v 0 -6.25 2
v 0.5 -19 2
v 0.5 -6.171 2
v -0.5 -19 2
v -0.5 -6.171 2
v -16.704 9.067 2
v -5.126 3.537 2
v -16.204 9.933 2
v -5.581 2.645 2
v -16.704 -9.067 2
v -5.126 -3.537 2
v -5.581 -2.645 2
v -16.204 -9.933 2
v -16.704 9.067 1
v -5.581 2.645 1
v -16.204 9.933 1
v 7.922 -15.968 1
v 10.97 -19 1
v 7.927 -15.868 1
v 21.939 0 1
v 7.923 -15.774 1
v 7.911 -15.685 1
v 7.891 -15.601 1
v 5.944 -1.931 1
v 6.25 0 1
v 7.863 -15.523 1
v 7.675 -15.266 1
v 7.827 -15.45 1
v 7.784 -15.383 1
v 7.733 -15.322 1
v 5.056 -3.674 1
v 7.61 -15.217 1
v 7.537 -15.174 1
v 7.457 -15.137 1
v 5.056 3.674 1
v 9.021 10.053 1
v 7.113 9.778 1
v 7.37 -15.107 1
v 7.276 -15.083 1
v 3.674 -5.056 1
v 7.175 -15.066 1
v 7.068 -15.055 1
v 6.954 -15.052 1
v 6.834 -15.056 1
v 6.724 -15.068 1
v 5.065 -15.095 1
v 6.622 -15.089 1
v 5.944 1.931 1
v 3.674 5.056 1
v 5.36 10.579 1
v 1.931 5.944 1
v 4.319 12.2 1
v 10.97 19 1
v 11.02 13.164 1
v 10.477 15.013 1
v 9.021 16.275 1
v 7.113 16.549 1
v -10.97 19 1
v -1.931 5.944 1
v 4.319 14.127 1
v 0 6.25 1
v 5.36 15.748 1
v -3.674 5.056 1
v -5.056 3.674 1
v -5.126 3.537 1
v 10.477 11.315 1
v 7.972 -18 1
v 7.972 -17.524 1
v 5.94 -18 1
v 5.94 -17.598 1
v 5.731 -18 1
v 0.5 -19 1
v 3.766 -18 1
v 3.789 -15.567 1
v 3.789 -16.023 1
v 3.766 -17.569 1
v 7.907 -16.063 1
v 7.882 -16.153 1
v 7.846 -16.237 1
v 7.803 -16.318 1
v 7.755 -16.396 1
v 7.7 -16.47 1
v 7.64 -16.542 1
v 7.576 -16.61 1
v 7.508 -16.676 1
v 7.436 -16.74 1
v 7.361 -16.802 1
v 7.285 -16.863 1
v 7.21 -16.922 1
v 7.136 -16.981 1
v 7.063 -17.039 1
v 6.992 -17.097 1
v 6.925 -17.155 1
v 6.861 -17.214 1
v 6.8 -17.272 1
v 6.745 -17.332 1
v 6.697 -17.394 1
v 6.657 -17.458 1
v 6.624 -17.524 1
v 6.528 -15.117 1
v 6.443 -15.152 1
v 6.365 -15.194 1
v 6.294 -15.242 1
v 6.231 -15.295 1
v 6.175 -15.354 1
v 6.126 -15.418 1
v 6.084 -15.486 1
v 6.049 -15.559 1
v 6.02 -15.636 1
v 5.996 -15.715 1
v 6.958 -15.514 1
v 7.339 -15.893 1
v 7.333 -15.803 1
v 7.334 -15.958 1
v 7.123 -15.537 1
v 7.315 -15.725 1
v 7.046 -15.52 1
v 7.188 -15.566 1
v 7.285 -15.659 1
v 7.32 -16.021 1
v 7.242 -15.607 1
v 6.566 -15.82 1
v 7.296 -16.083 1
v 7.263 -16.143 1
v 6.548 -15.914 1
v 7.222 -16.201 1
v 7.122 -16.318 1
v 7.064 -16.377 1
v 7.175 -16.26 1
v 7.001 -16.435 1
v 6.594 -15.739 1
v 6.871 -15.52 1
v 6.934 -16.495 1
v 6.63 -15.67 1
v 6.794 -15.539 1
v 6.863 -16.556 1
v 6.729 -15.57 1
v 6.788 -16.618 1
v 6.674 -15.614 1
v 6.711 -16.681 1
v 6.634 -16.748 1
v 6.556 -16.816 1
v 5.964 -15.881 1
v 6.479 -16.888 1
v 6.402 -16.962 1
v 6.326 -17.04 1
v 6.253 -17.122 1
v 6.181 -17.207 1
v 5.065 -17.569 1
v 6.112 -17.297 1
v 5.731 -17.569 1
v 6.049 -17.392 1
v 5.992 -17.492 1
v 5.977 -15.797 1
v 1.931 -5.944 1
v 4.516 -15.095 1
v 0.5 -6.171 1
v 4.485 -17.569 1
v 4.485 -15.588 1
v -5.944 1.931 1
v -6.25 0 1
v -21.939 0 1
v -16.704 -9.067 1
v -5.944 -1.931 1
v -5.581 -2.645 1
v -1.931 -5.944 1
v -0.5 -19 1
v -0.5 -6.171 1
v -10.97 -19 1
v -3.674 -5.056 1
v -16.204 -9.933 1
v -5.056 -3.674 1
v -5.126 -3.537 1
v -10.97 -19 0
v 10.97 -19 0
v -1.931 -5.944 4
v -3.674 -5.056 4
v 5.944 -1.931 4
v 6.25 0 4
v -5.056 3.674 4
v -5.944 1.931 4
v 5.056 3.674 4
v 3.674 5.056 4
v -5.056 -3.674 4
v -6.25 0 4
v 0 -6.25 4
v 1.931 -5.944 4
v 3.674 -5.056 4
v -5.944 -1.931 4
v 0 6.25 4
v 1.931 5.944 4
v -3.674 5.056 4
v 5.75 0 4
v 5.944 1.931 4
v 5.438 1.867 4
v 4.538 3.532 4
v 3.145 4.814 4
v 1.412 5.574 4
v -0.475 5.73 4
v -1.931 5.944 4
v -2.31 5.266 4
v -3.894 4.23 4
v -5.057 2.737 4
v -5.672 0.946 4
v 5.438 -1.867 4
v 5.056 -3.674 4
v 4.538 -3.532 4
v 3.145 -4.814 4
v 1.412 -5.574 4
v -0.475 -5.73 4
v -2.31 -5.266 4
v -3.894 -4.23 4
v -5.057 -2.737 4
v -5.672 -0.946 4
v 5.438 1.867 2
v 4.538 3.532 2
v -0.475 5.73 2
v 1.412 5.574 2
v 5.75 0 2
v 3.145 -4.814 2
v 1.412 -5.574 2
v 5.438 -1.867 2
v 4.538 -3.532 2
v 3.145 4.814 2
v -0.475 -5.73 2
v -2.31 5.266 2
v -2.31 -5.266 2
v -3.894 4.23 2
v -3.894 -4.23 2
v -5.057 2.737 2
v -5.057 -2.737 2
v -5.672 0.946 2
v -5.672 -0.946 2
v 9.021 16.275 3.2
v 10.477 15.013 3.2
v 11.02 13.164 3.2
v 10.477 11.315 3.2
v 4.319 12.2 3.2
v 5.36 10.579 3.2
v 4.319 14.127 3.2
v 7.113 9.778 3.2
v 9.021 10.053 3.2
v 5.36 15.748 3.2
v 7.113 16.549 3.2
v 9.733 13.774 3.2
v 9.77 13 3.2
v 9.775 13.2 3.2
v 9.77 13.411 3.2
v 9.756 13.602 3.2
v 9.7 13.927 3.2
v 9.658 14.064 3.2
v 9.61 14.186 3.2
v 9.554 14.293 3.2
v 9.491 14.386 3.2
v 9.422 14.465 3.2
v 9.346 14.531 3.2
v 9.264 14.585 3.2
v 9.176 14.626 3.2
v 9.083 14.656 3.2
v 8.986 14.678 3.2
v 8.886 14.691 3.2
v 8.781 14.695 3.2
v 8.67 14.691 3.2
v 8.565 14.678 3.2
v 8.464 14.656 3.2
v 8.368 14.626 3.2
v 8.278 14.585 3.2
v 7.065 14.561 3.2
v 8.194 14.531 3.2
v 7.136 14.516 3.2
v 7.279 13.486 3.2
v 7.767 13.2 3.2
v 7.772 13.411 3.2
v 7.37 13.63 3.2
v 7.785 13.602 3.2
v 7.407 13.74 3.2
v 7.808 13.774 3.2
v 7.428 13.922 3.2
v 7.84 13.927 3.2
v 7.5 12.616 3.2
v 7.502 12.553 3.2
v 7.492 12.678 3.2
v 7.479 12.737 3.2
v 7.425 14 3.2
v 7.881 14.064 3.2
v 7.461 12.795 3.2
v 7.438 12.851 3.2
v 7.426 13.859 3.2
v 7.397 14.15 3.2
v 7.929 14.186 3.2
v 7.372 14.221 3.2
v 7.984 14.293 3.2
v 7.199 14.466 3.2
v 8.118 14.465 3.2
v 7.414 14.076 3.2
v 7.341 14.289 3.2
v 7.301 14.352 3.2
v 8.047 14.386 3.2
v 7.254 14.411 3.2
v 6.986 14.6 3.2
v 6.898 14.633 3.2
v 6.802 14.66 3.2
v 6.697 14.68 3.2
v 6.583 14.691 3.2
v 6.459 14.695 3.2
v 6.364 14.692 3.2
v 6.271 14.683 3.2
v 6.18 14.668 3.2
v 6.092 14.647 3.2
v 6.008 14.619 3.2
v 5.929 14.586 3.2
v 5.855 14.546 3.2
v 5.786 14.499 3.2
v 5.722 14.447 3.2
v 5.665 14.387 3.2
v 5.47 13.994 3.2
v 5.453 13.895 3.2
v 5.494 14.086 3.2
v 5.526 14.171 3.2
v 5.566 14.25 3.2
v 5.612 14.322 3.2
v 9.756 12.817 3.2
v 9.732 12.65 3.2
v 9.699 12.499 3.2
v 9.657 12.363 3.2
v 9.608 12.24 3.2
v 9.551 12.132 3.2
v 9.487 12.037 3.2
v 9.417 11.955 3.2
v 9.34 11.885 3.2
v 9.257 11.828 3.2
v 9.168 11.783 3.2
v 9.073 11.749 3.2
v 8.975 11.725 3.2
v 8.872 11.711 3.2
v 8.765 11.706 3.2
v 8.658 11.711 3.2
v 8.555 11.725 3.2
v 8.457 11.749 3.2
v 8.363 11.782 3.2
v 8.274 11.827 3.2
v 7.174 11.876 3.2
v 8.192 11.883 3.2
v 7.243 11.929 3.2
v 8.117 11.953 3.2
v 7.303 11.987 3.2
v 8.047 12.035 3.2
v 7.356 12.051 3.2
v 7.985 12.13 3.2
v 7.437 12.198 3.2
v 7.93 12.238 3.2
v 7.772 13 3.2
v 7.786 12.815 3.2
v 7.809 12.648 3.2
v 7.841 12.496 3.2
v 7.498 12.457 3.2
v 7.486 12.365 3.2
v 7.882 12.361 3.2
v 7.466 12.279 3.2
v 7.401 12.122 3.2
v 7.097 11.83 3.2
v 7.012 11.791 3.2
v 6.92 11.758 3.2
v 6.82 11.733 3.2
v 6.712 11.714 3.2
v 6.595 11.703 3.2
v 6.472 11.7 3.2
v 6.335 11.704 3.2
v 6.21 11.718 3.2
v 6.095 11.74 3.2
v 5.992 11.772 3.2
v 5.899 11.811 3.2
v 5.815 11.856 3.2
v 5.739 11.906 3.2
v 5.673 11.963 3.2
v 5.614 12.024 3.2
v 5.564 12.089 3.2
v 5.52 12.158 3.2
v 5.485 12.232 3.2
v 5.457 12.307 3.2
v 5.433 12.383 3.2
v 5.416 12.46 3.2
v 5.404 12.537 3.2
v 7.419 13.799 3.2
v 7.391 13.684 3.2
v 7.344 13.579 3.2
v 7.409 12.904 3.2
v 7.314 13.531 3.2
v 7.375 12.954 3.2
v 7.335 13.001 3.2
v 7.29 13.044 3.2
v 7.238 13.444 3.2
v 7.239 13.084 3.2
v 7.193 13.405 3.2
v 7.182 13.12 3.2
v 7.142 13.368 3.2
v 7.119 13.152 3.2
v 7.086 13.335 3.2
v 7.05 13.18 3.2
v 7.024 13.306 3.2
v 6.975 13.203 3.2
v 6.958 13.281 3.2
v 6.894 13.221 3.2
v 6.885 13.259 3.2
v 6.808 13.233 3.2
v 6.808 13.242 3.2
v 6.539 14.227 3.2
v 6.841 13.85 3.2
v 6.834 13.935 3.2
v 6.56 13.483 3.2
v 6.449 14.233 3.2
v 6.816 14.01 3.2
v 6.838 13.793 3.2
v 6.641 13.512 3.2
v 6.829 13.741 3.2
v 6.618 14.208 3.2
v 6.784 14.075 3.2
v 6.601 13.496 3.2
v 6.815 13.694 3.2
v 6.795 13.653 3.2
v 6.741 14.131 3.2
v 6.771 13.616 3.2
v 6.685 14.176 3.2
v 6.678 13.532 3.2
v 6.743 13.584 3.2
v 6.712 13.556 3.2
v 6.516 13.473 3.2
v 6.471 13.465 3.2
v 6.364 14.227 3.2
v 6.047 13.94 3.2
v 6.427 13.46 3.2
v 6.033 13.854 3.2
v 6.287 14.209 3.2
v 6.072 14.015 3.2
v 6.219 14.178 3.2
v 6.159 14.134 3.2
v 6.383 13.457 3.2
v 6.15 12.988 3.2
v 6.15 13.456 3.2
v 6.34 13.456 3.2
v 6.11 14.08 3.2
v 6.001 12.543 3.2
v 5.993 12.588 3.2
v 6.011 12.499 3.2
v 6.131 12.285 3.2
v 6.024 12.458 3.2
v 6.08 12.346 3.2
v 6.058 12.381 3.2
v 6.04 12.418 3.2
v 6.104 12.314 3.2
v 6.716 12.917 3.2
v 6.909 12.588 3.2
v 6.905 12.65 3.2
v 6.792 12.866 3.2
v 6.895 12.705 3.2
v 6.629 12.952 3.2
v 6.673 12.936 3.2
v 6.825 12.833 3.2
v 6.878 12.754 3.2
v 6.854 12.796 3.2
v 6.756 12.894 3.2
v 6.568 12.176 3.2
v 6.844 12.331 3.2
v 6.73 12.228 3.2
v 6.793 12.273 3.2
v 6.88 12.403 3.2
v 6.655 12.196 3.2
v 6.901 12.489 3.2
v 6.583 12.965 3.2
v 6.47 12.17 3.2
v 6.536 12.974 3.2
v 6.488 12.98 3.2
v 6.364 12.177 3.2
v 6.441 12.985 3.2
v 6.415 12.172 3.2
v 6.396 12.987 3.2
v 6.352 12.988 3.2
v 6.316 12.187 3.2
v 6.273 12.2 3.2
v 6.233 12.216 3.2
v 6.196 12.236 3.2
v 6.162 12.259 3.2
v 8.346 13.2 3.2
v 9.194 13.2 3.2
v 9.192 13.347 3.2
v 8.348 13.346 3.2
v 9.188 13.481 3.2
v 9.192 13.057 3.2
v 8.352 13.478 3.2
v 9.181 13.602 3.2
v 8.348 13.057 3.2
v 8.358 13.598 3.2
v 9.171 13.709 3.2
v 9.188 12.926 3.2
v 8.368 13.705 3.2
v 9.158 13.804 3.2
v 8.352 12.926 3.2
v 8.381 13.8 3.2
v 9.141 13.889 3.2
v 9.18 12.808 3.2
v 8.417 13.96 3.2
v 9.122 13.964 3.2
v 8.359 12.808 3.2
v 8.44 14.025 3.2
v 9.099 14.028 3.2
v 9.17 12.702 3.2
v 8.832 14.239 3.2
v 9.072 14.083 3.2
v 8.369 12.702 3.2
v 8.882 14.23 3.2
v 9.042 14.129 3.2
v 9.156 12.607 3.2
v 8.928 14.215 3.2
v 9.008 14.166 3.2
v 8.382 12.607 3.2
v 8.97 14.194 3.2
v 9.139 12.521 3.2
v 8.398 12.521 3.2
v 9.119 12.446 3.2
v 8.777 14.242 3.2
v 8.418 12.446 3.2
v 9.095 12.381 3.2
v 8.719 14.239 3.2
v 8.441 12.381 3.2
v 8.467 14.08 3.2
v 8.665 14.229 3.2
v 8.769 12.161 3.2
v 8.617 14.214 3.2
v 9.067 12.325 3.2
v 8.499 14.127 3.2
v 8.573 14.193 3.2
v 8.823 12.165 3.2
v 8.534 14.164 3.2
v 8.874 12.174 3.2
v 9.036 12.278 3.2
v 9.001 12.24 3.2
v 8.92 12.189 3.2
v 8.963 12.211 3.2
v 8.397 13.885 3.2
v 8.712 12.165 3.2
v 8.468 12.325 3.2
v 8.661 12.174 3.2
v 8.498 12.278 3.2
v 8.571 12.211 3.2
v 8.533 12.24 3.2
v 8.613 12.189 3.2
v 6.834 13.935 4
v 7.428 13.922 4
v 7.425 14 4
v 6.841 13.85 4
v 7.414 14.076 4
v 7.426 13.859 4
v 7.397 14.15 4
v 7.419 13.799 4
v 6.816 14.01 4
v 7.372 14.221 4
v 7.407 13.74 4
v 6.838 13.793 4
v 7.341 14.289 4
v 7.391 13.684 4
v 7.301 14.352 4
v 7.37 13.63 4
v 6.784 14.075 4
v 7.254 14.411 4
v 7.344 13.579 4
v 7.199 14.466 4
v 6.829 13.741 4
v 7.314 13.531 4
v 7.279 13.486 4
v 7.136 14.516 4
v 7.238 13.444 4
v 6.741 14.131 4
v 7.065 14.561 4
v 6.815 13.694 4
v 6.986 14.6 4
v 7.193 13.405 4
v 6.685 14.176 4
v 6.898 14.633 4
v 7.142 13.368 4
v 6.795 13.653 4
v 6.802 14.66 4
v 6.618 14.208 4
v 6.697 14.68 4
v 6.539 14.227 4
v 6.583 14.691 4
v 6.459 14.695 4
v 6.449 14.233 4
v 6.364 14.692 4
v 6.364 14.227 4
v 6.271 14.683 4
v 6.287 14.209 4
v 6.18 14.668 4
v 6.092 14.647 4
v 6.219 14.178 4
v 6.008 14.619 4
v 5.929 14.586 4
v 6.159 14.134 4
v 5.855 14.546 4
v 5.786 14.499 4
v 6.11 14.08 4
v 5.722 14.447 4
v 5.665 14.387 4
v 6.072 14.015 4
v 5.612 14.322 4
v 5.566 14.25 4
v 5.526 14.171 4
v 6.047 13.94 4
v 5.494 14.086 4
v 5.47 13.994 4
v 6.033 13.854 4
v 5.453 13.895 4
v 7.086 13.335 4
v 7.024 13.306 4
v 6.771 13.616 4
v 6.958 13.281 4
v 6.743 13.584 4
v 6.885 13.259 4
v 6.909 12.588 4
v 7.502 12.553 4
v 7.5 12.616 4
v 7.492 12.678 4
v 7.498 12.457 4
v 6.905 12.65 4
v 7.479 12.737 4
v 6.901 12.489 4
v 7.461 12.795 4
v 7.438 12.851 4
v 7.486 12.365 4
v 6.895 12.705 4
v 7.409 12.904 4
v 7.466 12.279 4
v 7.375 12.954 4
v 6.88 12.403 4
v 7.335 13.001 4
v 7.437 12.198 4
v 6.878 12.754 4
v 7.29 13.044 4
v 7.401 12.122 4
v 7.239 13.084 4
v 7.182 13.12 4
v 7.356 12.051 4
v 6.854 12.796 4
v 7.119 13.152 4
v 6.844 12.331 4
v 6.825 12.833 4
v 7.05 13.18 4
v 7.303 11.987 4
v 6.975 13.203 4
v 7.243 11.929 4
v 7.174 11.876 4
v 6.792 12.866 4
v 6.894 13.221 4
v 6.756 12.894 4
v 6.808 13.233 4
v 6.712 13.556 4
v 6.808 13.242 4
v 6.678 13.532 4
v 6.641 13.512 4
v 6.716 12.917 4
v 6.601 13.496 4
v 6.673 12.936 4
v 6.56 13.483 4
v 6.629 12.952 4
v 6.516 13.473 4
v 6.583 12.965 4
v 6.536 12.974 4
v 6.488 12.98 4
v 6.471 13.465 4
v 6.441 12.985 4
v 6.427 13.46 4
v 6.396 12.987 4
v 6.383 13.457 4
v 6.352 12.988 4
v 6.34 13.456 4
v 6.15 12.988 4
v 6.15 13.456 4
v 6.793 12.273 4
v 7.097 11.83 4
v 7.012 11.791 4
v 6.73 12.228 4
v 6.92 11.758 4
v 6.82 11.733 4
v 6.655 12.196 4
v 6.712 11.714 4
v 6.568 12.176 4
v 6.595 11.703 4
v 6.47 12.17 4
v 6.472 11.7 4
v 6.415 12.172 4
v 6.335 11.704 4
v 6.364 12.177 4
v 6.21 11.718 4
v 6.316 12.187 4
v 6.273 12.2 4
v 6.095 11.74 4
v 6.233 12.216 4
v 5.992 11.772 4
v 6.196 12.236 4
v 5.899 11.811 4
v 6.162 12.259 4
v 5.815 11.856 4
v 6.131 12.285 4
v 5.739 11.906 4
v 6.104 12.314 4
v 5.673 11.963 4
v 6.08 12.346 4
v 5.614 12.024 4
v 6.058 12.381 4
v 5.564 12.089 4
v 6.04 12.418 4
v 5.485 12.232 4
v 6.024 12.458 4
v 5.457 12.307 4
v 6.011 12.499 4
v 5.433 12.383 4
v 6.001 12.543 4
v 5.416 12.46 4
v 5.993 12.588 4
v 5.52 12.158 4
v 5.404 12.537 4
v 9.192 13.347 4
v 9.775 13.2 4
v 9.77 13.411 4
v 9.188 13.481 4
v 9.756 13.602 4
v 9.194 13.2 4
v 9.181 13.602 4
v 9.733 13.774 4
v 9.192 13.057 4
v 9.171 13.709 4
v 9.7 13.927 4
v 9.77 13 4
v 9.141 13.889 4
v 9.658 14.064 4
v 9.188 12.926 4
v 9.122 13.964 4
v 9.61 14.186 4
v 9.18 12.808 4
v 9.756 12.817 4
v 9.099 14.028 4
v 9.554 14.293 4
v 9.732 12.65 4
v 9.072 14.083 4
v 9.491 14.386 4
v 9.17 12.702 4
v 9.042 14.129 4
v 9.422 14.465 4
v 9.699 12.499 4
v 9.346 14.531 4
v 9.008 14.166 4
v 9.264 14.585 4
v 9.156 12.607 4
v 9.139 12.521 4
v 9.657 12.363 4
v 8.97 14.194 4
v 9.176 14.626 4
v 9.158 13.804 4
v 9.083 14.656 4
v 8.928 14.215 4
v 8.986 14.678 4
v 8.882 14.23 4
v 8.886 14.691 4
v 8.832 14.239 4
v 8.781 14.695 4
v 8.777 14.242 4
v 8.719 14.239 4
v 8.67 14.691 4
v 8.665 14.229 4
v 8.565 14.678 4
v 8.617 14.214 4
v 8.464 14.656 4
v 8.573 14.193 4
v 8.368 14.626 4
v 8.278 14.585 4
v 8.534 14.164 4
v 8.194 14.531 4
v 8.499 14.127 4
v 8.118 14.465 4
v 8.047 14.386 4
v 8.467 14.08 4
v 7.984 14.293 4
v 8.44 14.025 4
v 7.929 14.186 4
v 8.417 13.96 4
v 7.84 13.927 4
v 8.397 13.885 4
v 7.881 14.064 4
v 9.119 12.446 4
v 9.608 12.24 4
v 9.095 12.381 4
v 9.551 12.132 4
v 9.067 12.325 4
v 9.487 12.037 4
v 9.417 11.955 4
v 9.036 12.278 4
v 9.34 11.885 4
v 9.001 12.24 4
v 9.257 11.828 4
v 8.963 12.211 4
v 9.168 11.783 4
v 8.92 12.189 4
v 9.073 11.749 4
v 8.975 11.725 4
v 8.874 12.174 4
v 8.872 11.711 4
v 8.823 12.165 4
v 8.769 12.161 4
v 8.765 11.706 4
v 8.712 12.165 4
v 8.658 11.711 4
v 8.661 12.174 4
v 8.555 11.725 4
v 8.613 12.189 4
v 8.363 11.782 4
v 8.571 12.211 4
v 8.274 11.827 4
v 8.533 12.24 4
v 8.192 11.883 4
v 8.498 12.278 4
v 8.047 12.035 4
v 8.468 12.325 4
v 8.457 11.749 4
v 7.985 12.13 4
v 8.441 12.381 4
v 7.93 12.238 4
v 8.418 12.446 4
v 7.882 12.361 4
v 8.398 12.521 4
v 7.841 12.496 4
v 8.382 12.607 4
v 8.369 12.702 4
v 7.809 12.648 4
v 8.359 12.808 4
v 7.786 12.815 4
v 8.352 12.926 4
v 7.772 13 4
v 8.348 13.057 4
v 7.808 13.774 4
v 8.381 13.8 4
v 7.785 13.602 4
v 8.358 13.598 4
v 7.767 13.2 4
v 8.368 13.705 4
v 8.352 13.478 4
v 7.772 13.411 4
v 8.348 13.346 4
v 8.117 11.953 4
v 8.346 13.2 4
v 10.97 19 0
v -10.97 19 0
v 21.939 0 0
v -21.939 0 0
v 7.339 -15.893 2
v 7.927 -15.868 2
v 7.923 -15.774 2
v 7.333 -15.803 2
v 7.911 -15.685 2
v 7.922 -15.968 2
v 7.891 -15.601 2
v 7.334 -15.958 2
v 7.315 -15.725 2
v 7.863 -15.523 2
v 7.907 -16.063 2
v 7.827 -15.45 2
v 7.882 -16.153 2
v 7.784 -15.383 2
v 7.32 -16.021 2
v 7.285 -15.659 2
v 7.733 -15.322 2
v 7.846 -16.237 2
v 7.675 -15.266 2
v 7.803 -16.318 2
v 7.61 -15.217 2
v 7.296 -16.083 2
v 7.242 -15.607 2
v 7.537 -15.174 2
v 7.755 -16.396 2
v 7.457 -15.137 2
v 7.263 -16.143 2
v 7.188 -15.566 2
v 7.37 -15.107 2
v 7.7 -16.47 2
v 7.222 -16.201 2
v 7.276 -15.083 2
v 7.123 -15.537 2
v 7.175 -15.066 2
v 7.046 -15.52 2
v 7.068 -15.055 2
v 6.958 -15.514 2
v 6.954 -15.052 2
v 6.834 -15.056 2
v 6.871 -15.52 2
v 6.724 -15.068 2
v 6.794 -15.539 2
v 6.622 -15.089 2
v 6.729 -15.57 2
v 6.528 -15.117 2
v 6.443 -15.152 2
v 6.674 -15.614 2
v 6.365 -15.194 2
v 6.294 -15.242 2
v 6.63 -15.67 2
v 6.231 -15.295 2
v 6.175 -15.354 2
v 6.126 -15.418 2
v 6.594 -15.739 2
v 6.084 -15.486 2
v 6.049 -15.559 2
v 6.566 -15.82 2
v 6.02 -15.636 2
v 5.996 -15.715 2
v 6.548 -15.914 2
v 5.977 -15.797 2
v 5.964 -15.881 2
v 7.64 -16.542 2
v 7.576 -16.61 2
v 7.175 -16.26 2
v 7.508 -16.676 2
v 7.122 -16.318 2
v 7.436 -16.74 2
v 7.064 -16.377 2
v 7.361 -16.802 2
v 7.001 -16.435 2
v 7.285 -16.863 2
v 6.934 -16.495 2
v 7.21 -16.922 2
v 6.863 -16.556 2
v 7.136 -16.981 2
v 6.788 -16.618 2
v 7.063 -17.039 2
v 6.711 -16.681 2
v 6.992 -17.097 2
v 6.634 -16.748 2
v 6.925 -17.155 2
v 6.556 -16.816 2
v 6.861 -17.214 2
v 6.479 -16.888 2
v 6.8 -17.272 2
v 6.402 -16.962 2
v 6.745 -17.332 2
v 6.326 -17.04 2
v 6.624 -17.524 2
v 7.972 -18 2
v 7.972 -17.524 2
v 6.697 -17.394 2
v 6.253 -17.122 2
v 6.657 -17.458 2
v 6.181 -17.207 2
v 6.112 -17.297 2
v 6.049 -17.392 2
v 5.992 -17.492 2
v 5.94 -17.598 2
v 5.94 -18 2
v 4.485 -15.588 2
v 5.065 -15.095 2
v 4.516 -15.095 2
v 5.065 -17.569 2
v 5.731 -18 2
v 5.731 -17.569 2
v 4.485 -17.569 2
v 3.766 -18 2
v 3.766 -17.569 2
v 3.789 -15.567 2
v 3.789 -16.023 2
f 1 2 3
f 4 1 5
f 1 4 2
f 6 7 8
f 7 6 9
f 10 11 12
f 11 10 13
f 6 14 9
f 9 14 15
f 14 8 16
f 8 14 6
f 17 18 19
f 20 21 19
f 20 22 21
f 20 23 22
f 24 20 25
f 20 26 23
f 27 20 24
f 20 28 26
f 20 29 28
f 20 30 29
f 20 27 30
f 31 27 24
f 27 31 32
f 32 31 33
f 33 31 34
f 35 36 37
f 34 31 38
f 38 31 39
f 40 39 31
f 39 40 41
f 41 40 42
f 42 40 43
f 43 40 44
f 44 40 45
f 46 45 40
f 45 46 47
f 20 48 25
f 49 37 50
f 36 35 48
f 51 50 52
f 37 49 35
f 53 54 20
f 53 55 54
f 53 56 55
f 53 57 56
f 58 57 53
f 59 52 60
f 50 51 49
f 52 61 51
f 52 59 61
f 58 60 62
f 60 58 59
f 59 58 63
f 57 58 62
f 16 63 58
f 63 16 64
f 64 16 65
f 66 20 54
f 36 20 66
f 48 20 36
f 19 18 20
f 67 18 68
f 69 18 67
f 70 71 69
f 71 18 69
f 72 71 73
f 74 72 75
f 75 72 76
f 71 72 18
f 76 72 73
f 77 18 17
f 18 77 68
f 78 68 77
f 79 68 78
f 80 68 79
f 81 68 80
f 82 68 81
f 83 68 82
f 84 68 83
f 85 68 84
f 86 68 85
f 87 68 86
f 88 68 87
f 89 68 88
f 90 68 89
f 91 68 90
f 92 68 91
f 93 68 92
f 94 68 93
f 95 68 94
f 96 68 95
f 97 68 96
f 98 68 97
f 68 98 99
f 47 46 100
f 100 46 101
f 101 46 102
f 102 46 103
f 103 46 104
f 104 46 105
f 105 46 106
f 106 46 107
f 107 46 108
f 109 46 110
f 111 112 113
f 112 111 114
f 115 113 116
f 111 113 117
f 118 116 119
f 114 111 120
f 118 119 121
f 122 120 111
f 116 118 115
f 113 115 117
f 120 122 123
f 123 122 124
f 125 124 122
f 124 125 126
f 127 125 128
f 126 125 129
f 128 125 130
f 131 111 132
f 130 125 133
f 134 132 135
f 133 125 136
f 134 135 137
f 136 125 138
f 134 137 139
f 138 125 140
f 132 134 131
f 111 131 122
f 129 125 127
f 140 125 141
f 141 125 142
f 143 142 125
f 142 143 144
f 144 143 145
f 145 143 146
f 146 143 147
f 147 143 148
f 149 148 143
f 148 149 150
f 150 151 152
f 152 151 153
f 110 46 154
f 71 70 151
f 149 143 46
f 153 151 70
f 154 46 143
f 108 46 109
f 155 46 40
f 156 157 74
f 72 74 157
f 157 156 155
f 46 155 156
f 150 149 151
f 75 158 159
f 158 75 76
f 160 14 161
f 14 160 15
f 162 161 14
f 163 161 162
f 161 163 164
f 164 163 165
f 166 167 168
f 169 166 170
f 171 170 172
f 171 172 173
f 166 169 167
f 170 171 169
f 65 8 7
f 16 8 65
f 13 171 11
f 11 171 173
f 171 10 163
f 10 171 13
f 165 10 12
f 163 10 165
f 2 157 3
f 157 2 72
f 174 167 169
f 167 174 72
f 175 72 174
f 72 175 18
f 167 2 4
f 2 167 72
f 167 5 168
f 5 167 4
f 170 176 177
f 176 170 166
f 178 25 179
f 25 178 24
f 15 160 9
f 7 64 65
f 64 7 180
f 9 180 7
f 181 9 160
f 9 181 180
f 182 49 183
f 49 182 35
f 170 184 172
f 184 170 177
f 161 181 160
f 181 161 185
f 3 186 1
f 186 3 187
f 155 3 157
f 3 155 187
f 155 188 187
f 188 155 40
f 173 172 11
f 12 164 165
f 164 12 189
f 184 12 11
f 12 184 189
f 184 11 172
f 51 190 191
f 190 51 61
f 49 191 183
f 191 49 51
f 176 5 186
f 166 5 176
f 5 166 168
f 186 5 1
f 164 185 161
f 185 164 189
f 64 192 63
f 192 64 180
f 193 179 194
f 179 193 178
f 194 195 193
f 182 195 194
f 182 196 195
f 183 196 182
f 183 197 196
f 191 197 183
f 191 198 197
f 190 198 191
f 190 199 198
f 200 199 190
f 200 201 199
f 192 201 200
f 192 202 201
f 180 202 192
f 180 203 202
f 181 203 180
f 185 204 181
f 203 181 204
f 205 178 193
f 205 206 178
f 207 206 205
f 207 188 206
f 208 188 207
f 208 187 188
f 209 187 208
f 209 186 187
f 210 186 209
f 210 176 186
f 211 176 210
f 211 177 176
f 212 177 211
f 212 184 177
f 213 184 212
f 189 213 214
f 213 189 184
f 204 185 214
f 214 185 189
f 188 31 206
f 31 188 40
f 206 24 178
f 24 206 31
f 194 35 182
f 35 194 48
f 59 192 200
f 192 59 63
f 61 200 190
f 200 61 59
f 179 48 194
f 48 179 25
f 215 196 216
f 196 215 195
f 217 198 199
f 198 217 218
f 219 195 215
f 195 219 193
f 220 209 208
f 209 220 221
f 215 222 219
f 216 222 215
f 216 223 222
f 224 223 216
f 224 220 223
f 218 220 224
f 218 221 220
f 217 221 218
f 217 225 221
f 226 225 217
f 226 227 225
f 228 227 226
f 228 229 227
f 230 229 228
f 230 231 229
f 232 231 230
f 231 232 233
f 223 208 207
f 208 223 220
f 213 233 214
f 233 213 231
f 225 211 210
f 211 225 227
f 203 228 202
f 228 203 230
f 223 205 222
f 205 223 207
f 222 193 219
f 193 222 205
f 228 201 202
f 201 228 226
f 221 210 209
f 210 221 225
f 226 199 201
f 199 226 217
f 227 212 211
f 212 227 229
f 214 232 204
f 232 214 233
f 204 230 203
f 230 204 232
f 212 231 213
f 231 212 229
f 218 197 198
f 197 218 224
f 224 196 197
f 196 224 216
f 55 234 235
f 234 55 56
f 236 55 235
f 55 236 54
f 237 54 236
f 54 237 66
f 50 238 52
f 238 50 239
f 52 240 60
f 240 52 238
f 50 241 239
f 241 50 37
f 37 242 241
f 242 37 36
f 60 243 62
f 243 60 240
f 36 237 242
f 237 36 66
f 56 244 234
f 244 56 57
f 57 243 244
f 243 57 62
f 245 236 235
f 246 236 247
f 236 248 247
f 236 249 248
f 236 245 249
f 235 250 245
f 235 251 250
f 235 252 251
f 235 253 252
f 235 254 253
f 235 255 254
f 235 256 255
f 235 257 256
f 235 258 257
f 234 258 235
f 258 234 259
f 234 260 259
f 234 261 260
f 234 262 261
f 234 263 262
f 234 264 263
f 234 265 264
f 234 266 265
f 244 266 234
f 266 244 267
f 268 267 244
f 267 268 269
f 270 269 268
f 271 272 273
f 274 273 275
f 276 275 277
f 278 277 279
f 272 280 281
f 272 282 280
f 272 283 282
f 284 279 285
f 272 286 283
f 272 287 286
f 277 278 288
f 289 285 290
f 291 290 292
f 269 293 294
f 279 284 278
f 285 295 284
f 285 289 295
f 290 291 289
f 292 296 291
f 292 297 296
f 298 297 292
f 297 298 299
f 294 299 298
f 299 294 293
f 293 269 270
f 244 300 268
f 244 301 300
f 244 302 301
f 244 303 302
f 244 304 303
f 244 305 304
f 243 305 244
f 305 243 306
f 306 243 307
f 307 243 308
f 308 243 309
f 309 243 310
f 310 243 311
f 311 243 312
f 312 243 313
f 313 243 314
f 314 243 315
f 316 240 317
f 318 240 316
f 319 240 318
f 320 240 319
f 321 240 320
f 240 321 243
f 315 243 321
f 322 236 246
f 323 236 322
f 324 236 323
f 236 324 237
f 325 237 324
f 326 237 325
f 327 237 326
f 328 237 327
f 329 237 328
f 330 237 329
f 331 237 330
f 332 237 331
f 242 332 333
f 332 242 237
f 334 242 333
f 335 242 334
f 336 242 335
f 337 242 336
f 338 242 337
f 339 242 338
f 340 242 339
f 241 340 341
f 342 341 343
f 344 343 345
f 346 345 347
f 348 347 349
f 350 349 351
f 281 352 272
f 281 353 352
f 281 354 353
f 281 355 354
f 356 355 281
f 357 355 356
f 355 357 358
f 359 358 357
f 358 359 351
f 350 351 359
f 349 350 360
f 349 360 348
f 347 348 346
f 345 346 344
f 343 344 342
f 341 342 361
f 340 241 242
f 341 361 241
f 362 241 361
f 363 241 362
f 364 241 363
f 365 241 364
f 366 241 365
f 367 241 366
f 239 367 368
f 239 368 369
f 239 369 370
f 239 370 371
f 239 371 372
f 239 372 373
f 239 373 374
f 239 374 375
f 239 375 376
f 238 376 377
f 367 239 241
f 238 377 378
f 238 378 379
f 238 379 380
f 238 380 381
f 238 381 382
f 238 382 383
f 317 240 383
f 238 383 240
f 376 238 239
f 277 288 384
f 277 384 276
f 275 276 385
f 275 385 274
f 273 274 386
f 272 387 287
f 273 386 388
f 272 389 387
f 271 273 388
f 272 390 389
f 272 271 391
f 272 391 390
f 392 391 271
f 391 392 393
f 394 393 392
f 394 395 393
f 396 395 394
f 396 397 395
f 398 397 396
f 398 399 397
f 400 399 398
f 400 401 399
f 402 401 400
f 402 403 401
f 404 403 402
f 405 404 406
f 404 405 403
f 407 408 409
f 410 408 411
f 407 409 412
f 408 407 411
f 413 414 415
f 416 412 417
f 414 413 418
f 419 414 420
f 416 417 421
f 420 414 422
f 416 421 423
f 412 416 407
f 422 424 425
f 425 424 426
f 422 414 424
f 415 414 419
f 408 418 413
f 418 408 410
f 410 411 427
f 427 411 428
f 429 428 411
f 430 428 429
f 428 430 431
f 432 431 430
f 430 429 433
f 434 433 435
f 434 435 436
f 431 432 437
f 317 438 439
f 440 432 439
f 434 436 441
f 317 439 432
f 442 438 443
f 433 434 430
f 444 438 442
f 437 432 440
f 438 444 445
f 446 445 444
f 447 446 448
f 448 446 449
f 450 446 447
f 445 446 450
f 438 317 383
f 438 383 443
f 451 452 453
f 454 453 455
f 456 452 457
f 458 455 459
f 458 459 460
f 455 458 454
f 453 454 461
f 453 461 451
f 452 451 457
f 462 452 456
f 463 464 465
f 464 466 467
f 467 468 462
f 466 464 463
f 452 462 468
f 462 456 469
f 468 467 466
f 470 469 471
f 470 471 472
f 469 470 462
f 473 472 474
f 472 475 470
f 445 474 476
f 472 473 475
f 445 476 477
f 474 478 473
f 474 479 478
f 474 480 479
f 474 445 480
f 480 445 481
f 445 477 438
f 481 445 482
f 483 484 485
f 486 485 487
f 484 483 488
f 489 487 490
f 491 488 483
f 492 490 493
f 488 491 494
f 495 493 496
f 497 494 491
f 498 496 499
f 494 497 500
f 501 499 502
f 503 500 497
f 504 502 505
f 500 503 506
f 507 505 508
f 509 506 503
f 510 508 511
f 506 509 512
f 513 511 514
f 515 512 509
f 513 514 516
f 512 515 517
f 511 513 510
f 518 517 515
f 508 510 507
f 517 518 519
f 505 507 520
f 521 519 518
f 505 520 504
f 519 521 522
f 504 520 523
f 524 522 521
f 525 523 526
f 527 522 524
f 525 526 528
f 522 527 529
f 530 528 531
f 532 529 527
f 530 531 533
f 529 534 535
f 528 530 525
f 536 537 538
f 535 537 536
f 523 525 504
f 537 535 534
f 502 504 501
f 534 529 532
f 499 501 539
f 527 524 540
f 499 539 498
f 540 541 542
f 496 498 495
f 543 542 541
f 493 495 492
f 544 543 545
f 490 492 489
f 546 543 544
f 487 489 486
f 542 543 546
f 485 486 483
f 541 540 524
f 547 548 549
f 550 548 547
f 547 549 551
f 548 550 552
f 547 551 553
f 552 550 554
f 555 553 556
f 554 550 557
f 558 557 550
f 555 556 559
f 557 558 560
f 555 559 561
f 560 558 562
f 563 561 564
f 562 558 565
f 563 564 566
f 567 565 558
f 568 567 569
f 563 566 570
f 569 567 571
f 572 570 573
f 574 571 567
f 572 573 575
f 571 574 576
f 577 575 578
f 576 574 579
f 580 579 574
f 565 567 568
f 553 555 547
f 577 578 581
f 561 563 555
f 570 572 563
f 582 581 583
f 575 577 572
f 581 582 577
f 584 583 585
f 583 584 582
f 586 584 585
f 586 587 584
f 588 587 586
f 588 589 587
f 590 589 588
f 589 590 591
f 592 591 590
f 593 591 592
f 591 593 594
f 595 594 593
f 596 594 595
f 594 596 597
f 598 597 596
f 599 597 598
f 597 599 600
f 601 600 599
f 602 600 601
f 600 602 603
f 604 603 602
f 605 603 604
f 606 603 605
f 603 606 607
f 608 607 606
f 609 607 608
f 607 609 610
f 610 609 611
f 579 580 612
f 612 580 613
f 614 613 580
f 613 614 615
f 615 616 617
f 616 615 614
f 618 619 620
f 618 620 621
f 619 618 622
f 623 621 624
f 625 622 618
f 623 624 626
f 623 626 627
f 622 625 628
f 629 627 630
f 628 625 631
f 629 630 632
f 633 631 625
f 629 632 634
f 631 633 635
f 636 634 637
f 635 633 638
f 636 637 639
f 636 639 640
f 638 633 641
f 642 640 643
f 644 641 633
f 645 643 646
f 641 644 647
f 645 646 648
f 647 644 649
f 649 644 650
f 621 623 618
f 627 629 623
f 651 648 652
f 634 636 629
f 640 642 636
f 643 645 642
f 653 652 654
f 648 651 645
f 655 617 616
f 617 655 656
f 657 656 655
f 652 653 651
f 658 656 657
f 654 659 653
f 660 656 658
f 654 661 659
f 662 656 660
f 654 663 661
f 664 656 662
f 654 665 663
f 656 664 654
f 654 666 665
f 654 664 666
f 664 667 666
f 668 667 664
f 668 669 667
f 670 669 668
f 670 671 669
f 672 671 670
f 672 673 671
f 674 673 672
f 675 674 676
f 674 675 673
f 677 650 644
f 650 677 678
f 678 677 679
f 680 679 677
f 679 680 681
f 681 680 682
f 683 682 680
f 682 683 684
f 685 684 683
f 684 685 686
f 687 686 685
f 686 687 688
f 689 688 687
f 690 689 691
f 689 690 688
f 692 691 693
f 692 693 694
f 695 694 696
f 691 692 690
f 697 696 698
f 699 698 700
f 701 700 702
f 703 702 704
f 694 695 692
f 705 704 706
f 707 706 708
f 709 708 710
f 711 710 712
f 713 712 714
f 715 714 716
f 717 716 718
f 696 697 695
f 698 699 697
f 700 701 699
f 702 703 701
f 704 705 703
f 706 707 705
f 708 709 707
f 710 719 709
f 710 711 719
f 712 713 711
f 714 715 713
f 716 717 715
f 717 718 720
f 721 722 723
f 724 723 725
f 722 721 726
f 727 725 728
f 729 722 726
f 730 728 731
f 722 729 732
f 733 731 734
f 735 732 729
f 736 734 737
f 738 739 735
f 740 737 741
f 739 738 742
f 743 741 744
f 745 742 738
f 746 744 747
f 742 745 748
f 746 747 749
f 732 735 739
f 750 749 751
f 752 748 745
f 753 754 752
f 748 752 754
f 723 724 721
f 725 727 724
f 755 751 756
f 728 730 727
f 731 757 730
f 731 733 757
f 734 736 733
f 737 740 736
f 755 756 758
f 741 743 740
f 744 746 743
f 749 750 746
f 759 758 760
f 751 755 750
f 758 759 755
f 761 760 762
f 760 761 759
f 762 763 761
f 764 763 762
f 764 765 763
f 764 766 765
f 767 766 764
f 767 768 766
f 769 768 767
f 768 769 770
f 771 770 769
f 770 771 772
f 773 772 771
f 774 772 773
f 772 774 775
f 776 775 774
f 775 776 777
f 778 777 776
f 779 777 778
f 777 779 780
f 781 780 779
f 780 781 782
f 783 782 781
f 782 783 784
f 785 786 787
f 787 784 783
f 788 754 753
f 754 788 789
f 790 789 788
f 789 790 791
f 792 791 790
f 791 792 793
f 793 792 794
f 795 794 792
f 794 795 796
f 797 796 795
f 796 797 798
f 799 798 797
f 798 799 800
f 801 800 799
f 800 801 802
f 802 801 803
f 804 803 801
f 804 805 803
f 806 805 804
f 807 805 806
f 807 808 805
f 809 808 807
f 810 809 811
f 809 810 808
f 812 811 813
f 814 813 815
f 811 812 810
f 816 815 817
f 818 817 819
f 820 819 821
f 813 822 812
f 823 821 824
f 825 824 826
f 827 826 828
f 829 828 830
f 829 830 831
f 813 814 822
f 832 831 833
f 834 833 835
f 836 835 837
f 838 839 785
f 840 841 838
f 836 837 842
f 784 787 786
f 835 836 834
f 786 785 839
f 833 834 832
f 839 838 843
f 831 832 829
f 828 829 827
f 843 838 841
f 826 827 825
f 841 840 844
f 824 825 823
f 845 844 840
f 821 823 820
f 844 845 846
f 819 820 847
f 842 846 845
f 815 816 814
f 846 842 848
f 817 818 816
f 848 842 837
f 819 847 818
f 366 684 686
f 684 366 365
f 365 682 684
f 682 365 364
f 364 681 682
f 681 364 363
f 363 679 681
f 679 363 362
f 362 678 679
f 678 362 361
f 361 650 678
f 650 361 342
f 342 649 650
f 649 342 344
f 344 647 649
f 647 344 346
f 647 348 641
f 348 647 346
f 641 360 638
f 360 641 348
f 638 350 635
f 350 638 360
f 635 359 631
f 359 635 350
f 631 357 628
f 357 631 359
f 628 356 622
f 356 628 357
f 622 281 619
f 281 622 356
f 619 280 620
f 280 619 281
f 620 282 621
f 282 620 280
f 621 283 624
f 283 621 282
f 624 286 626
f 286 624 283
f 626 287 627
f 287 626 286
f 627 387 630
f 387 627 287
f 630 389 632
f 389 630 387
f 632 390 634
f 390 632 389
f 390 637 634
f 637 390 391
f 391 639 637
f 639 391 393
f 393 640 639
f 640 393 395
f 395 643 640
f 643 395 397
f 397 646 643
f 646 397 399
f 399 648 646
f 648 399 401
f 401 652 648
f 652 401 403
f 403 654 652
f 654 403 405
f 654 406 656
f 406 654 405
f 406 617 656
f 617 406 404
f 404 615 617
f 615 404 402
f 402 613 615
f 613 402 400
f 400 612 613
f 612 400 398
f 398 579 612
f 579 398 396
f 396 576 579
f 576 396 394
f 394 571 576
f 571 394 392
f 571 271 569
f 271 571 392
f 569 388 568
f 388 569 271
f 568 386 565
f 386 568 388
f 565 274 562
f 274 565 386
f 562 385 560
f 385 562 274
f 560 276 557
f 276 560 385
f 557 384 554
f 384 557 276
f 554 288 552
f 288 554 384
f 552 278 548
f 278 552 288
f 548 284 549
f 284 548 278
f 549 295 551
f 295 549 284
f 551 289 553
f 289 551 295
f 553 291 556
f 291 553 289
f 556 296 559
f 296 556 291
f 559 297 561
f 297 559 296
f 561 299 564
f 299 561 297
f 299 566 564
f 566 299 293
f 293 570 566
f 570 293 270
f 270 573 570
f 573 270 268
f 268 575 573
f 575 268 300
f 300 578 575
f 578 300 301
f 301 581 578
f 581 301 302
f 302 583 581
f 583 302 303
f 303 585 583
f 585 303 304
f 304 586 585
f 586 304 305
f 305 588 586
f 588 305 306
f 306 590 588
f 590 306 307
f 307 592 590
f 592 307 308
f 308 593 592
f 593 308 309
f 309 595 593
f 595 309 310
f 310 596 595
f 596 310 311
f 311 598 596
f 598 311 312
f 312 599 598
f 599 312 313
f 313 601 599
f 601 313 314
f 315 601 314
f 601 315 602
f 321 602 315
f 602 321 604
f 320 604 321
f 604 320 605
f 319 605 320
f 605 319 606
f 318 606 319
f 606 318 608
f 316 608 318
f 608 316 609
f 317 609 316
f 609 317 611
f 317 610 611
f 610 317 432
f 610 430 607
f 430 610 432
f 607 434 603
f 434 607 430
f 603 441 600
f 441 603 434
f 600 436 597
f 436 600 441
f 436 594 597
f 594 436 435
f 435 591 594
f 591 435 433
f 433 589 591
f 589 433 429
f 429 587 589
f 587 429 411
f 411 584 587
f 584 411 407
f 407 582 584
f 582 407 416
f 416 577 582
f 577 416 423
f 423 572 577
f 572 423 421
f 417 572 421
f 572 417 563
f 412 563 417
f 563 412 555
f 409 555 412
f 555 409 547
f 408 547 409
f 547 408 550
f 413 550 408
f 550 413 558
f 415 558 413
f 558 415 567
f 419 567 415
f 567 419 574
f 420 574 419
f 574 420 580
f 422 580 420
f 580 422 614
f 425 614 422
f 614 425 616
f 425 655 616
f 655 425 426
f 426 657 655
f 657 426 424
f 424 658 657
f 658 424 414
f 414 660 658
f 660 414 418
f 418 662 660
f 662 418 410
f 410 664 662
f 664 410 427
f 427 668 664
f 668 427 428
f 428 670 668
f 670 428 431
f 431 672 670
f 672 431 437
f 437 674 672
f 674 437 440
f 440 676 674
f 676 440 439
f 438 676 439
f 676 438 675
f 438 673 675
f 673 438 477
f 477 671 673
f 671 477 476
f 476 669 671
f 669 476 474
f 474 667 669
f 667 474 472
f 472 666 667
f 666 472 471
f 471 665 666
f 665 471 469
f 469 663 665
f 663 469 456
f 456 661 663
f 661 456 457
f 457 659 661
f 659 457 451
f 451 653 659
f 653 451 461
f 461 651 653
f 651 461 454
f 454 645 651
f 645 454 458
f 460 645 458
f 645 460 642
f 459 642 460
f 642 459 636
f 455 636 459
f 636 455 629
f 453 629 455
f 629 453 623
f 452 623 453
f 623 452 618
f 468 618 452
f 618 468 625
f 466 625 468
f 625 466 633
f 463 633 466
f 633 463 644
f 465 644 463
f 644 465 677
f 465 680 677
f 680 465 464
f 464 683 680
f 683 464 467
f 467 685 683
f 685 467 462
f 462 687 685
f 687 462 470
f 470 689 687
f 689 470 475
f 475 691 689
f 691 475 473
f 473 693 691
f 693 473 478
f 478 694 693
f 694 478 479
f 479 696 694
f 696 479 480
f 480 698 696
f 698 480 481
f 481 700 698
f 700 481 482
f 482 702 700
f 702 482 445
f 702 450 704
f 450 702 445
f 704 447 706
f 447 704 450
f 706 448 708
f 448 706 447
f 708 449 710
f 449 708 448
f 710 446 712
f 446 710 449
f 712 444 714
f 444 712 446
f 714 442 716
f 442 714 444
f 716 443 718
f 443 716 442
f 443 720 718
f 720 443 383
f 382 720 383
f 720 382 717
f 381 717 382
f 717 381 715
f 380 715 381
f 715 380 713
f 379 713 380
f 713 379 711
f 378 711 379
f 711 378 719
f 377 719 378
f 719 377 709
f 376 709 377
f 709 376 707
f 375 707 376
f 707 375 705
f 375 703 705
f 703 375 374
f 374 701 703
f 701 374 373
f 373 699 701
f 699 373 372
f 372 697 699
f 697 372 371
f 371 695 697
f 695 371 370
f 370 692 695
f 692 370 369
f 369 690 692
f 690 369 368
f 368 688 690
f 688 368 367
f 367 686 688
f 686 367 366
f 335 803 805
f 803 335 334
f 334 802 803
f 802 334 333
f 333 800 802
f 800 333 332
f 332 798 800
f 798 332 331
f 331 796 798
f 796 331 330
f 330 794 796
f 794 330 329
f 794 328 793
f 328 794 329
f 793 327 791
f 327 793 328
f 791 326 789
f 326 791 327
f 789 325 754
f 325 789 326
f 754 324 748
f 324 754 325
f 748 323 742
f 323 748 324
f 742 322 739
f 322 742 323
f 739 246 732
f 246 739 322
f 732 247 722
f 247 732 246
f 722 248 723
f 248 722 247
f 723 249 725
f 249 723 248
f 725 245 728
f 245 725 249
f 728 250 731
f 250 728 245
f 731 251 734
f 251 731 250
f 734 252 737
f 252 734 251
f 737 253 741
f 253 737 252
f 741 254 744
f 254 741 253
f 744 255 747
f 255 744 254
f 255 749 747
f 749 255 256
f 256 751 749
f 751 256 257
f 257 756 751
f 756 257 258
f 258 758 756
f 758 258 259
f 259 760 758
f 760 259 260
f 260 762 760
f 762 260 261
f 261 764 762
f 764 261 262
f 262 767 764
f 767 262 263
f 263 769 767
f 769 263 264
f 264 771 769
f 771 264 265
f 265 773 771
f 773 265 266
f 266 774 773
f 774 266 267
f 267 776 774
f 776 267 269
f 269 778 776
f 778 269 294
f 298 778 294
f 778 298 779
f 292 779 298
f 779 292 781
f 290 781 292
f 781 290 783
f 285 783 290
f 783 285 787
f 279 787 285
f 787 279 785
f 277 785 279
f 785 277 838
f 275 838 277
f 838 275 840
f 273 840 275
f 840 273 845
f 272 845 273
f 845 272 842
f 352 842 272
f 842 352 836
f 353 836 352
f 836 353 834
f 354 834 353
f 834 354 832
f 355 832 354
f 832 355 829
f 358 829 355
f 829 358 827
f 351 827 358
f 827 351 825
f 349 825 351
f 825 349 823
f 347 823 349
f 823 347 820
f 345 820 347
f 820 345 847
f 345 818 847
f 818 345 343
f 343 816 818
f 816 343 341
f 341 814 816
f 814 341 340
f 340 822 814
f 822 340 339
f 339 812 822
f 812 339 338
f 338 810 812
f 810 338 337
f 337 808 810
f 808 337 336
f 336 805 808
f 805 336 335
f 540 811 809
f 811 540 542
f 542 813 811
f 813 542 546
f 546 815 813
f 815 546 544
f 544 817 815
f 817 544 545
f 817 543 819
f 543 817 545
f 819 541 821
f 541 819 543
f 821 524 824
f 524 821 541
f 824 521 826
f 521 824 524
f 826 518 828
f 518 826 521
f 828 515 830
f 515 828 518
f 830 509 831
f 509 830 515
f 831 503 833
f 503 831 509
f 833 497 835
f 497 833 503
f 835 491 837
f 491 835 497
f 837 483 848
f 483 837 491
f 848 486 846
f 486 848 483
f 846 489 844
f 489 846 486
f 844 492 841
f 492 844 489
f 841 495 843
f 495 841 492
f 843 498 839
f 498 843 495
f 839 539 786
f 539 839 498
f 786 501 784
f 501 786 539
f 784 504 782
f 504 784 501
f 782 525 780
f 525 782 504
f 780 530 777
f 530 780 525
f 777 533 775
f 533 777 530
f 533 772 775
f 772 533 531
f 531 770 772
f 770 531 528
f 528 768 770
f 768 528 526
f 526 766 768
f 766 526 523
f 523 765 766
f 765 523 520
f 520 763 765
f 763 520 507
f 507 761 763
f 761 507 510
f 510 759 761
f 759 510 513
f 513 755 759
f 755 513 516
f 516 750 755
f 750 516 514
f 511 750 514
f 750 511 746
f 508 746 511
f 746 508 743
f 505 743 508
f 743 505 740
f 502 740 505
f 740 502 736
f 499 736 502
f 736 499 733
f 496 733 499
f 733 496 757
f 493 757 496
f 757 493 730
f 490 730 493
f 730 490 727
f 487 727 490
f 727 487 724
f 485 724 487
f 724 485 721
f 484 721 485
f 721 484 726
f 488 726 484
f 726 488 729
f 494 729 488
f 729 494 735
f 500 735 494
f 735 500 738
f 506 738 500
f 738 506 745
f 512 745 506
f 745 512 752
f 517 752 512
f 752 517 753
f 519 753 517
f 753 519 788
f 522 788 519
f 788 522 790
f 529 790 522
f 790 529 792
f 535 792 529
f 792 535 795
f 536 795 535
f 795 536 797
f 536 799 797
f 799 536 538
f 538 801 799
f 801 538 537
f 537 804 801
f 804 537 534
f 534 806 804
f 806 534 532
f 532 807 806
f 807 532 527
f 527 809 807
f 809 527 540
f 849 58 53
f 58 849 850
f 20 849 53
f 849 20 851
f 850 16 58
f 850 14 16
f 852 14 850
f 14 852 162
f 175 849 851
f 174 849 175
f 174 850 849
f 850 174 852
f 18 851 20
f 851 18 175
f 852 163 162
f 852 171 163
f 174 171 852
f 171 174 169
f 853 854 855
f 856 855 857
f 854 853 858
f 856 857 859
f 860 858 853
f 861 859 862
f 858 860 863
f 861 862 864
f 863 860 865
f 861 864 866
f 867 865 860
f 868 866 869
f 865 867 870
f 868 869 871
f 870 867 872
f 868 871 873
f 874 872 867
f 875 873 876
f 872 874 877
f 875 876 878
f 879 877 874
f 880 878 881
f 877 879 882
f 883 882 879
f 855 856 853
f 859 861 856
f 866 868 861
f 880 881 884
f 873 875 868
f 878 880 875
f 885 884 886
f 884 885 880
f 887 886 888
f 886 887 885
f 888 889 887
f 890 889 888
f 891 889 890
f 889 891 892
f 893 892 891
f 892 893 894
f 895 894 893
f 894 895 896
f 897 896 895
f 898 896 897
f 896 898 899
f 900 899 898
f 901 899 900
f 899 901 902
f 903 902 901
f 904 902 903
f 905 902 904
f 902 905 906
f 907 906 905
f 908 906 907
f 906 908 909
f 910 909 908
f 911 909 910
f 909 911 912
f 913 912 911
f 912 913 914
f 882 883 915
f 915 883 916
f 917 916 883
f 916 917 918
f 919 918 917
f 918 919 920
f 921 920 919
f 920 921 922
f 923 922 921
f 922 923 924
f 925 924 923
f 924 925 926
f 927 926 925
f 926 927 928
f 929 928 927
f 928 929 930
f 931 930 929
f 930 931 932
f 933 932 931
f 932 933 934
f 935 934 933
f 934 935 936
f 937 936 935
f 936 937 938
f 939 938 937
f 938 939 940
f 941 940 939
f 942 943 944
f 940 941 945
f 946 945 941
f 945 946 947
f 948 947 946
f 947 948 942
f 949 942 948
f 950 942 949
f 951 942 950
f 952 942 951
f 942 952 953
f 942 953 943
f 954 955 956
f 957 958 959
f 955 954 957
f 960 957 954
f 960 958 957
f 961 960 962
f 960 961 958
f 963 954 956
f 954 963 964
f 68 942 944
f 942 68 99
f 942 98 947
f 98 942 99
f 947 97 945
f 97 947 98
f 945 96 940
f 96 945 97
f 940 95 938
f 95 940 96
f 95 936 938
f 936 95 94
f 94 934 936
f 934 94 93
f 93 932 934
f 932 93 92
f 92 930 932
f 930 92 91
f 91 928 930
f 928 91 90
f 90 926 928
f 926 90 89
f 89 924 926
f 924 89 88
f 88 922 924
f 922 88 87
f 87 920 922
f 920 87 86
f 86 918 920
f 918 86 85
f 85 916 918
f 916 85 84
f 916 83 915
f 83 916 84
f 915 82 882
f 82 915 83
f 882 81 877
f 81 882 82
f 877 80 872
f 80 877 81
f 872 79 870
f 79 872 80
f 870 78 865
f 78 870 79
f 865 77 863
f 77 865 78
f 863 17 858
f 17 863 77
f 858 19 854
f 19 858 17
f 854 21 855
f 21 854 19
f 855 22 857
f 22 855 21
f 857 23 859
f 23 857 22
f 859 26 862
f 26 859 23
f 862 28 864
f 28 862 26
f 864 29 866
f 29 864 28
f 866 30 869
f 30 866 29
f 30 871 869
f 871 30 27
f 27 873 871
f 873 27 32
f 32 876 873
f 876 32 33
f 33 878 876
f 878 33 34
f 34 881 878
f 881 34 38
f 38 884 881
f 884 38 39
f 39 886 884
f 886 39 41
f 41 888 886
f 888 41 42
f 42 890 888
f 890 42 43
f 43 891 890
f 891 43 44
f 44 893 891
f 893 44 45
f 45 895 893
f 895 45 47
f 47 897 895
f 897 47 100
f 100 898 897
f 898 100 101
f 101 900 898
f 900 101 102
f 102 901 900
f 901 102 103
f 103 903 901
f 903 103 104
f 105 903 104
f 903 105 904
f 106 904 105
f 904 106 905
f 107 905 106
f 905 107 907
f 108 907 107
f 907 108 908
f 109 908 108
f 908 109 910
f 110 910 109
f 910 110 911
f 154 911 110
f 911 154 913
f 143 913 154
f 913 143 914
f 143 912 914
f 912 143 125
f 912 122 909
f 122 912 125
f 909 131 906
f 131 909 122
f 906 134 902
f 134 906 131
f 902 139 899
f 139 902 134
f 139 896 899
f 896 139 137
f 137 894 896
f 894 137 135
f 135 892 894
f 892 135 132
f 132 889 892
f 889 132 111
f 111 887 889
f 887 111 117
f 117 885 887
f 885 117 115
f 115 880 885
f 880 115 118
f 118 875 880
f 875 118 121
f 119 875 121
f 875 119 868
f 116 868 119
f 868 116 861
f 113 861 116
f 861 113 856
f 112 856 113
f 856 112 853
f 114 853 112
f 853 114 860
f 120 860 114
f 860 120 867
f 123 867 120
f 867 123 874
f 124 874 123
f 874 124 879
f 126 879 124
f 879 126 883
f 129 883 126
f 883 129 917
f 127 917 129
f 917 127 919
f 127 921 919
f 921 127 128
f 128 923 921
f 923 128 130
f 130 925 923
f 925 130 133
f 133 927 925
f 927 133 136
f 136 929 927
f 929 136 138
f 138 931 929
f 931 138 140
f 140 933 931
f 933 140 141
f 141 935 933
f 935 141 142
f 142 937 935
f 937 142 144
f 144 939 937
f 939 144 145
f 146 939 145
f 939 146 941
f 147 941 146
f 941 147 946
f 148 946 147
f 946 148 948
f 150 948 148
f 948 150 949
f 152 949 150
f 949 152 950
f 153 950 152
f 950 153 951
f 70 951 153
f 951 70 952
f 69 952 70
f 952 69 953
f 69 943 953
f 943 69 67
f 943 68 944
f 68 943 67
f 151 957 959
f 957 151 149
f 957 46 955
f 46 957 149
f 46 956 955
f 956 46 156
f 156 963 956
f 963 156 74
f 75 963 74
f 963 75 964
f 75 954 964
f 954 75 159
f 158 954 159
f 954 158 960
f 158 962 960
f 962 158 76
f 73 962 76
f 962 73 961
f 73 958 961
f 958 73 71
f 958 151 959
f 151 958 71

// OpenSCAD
include <../Scripts/18xx tiles basic functions.scad>
hex();
put_tilenr("12");
single_city(v=[1,2,3]);
put_value("30",30);
